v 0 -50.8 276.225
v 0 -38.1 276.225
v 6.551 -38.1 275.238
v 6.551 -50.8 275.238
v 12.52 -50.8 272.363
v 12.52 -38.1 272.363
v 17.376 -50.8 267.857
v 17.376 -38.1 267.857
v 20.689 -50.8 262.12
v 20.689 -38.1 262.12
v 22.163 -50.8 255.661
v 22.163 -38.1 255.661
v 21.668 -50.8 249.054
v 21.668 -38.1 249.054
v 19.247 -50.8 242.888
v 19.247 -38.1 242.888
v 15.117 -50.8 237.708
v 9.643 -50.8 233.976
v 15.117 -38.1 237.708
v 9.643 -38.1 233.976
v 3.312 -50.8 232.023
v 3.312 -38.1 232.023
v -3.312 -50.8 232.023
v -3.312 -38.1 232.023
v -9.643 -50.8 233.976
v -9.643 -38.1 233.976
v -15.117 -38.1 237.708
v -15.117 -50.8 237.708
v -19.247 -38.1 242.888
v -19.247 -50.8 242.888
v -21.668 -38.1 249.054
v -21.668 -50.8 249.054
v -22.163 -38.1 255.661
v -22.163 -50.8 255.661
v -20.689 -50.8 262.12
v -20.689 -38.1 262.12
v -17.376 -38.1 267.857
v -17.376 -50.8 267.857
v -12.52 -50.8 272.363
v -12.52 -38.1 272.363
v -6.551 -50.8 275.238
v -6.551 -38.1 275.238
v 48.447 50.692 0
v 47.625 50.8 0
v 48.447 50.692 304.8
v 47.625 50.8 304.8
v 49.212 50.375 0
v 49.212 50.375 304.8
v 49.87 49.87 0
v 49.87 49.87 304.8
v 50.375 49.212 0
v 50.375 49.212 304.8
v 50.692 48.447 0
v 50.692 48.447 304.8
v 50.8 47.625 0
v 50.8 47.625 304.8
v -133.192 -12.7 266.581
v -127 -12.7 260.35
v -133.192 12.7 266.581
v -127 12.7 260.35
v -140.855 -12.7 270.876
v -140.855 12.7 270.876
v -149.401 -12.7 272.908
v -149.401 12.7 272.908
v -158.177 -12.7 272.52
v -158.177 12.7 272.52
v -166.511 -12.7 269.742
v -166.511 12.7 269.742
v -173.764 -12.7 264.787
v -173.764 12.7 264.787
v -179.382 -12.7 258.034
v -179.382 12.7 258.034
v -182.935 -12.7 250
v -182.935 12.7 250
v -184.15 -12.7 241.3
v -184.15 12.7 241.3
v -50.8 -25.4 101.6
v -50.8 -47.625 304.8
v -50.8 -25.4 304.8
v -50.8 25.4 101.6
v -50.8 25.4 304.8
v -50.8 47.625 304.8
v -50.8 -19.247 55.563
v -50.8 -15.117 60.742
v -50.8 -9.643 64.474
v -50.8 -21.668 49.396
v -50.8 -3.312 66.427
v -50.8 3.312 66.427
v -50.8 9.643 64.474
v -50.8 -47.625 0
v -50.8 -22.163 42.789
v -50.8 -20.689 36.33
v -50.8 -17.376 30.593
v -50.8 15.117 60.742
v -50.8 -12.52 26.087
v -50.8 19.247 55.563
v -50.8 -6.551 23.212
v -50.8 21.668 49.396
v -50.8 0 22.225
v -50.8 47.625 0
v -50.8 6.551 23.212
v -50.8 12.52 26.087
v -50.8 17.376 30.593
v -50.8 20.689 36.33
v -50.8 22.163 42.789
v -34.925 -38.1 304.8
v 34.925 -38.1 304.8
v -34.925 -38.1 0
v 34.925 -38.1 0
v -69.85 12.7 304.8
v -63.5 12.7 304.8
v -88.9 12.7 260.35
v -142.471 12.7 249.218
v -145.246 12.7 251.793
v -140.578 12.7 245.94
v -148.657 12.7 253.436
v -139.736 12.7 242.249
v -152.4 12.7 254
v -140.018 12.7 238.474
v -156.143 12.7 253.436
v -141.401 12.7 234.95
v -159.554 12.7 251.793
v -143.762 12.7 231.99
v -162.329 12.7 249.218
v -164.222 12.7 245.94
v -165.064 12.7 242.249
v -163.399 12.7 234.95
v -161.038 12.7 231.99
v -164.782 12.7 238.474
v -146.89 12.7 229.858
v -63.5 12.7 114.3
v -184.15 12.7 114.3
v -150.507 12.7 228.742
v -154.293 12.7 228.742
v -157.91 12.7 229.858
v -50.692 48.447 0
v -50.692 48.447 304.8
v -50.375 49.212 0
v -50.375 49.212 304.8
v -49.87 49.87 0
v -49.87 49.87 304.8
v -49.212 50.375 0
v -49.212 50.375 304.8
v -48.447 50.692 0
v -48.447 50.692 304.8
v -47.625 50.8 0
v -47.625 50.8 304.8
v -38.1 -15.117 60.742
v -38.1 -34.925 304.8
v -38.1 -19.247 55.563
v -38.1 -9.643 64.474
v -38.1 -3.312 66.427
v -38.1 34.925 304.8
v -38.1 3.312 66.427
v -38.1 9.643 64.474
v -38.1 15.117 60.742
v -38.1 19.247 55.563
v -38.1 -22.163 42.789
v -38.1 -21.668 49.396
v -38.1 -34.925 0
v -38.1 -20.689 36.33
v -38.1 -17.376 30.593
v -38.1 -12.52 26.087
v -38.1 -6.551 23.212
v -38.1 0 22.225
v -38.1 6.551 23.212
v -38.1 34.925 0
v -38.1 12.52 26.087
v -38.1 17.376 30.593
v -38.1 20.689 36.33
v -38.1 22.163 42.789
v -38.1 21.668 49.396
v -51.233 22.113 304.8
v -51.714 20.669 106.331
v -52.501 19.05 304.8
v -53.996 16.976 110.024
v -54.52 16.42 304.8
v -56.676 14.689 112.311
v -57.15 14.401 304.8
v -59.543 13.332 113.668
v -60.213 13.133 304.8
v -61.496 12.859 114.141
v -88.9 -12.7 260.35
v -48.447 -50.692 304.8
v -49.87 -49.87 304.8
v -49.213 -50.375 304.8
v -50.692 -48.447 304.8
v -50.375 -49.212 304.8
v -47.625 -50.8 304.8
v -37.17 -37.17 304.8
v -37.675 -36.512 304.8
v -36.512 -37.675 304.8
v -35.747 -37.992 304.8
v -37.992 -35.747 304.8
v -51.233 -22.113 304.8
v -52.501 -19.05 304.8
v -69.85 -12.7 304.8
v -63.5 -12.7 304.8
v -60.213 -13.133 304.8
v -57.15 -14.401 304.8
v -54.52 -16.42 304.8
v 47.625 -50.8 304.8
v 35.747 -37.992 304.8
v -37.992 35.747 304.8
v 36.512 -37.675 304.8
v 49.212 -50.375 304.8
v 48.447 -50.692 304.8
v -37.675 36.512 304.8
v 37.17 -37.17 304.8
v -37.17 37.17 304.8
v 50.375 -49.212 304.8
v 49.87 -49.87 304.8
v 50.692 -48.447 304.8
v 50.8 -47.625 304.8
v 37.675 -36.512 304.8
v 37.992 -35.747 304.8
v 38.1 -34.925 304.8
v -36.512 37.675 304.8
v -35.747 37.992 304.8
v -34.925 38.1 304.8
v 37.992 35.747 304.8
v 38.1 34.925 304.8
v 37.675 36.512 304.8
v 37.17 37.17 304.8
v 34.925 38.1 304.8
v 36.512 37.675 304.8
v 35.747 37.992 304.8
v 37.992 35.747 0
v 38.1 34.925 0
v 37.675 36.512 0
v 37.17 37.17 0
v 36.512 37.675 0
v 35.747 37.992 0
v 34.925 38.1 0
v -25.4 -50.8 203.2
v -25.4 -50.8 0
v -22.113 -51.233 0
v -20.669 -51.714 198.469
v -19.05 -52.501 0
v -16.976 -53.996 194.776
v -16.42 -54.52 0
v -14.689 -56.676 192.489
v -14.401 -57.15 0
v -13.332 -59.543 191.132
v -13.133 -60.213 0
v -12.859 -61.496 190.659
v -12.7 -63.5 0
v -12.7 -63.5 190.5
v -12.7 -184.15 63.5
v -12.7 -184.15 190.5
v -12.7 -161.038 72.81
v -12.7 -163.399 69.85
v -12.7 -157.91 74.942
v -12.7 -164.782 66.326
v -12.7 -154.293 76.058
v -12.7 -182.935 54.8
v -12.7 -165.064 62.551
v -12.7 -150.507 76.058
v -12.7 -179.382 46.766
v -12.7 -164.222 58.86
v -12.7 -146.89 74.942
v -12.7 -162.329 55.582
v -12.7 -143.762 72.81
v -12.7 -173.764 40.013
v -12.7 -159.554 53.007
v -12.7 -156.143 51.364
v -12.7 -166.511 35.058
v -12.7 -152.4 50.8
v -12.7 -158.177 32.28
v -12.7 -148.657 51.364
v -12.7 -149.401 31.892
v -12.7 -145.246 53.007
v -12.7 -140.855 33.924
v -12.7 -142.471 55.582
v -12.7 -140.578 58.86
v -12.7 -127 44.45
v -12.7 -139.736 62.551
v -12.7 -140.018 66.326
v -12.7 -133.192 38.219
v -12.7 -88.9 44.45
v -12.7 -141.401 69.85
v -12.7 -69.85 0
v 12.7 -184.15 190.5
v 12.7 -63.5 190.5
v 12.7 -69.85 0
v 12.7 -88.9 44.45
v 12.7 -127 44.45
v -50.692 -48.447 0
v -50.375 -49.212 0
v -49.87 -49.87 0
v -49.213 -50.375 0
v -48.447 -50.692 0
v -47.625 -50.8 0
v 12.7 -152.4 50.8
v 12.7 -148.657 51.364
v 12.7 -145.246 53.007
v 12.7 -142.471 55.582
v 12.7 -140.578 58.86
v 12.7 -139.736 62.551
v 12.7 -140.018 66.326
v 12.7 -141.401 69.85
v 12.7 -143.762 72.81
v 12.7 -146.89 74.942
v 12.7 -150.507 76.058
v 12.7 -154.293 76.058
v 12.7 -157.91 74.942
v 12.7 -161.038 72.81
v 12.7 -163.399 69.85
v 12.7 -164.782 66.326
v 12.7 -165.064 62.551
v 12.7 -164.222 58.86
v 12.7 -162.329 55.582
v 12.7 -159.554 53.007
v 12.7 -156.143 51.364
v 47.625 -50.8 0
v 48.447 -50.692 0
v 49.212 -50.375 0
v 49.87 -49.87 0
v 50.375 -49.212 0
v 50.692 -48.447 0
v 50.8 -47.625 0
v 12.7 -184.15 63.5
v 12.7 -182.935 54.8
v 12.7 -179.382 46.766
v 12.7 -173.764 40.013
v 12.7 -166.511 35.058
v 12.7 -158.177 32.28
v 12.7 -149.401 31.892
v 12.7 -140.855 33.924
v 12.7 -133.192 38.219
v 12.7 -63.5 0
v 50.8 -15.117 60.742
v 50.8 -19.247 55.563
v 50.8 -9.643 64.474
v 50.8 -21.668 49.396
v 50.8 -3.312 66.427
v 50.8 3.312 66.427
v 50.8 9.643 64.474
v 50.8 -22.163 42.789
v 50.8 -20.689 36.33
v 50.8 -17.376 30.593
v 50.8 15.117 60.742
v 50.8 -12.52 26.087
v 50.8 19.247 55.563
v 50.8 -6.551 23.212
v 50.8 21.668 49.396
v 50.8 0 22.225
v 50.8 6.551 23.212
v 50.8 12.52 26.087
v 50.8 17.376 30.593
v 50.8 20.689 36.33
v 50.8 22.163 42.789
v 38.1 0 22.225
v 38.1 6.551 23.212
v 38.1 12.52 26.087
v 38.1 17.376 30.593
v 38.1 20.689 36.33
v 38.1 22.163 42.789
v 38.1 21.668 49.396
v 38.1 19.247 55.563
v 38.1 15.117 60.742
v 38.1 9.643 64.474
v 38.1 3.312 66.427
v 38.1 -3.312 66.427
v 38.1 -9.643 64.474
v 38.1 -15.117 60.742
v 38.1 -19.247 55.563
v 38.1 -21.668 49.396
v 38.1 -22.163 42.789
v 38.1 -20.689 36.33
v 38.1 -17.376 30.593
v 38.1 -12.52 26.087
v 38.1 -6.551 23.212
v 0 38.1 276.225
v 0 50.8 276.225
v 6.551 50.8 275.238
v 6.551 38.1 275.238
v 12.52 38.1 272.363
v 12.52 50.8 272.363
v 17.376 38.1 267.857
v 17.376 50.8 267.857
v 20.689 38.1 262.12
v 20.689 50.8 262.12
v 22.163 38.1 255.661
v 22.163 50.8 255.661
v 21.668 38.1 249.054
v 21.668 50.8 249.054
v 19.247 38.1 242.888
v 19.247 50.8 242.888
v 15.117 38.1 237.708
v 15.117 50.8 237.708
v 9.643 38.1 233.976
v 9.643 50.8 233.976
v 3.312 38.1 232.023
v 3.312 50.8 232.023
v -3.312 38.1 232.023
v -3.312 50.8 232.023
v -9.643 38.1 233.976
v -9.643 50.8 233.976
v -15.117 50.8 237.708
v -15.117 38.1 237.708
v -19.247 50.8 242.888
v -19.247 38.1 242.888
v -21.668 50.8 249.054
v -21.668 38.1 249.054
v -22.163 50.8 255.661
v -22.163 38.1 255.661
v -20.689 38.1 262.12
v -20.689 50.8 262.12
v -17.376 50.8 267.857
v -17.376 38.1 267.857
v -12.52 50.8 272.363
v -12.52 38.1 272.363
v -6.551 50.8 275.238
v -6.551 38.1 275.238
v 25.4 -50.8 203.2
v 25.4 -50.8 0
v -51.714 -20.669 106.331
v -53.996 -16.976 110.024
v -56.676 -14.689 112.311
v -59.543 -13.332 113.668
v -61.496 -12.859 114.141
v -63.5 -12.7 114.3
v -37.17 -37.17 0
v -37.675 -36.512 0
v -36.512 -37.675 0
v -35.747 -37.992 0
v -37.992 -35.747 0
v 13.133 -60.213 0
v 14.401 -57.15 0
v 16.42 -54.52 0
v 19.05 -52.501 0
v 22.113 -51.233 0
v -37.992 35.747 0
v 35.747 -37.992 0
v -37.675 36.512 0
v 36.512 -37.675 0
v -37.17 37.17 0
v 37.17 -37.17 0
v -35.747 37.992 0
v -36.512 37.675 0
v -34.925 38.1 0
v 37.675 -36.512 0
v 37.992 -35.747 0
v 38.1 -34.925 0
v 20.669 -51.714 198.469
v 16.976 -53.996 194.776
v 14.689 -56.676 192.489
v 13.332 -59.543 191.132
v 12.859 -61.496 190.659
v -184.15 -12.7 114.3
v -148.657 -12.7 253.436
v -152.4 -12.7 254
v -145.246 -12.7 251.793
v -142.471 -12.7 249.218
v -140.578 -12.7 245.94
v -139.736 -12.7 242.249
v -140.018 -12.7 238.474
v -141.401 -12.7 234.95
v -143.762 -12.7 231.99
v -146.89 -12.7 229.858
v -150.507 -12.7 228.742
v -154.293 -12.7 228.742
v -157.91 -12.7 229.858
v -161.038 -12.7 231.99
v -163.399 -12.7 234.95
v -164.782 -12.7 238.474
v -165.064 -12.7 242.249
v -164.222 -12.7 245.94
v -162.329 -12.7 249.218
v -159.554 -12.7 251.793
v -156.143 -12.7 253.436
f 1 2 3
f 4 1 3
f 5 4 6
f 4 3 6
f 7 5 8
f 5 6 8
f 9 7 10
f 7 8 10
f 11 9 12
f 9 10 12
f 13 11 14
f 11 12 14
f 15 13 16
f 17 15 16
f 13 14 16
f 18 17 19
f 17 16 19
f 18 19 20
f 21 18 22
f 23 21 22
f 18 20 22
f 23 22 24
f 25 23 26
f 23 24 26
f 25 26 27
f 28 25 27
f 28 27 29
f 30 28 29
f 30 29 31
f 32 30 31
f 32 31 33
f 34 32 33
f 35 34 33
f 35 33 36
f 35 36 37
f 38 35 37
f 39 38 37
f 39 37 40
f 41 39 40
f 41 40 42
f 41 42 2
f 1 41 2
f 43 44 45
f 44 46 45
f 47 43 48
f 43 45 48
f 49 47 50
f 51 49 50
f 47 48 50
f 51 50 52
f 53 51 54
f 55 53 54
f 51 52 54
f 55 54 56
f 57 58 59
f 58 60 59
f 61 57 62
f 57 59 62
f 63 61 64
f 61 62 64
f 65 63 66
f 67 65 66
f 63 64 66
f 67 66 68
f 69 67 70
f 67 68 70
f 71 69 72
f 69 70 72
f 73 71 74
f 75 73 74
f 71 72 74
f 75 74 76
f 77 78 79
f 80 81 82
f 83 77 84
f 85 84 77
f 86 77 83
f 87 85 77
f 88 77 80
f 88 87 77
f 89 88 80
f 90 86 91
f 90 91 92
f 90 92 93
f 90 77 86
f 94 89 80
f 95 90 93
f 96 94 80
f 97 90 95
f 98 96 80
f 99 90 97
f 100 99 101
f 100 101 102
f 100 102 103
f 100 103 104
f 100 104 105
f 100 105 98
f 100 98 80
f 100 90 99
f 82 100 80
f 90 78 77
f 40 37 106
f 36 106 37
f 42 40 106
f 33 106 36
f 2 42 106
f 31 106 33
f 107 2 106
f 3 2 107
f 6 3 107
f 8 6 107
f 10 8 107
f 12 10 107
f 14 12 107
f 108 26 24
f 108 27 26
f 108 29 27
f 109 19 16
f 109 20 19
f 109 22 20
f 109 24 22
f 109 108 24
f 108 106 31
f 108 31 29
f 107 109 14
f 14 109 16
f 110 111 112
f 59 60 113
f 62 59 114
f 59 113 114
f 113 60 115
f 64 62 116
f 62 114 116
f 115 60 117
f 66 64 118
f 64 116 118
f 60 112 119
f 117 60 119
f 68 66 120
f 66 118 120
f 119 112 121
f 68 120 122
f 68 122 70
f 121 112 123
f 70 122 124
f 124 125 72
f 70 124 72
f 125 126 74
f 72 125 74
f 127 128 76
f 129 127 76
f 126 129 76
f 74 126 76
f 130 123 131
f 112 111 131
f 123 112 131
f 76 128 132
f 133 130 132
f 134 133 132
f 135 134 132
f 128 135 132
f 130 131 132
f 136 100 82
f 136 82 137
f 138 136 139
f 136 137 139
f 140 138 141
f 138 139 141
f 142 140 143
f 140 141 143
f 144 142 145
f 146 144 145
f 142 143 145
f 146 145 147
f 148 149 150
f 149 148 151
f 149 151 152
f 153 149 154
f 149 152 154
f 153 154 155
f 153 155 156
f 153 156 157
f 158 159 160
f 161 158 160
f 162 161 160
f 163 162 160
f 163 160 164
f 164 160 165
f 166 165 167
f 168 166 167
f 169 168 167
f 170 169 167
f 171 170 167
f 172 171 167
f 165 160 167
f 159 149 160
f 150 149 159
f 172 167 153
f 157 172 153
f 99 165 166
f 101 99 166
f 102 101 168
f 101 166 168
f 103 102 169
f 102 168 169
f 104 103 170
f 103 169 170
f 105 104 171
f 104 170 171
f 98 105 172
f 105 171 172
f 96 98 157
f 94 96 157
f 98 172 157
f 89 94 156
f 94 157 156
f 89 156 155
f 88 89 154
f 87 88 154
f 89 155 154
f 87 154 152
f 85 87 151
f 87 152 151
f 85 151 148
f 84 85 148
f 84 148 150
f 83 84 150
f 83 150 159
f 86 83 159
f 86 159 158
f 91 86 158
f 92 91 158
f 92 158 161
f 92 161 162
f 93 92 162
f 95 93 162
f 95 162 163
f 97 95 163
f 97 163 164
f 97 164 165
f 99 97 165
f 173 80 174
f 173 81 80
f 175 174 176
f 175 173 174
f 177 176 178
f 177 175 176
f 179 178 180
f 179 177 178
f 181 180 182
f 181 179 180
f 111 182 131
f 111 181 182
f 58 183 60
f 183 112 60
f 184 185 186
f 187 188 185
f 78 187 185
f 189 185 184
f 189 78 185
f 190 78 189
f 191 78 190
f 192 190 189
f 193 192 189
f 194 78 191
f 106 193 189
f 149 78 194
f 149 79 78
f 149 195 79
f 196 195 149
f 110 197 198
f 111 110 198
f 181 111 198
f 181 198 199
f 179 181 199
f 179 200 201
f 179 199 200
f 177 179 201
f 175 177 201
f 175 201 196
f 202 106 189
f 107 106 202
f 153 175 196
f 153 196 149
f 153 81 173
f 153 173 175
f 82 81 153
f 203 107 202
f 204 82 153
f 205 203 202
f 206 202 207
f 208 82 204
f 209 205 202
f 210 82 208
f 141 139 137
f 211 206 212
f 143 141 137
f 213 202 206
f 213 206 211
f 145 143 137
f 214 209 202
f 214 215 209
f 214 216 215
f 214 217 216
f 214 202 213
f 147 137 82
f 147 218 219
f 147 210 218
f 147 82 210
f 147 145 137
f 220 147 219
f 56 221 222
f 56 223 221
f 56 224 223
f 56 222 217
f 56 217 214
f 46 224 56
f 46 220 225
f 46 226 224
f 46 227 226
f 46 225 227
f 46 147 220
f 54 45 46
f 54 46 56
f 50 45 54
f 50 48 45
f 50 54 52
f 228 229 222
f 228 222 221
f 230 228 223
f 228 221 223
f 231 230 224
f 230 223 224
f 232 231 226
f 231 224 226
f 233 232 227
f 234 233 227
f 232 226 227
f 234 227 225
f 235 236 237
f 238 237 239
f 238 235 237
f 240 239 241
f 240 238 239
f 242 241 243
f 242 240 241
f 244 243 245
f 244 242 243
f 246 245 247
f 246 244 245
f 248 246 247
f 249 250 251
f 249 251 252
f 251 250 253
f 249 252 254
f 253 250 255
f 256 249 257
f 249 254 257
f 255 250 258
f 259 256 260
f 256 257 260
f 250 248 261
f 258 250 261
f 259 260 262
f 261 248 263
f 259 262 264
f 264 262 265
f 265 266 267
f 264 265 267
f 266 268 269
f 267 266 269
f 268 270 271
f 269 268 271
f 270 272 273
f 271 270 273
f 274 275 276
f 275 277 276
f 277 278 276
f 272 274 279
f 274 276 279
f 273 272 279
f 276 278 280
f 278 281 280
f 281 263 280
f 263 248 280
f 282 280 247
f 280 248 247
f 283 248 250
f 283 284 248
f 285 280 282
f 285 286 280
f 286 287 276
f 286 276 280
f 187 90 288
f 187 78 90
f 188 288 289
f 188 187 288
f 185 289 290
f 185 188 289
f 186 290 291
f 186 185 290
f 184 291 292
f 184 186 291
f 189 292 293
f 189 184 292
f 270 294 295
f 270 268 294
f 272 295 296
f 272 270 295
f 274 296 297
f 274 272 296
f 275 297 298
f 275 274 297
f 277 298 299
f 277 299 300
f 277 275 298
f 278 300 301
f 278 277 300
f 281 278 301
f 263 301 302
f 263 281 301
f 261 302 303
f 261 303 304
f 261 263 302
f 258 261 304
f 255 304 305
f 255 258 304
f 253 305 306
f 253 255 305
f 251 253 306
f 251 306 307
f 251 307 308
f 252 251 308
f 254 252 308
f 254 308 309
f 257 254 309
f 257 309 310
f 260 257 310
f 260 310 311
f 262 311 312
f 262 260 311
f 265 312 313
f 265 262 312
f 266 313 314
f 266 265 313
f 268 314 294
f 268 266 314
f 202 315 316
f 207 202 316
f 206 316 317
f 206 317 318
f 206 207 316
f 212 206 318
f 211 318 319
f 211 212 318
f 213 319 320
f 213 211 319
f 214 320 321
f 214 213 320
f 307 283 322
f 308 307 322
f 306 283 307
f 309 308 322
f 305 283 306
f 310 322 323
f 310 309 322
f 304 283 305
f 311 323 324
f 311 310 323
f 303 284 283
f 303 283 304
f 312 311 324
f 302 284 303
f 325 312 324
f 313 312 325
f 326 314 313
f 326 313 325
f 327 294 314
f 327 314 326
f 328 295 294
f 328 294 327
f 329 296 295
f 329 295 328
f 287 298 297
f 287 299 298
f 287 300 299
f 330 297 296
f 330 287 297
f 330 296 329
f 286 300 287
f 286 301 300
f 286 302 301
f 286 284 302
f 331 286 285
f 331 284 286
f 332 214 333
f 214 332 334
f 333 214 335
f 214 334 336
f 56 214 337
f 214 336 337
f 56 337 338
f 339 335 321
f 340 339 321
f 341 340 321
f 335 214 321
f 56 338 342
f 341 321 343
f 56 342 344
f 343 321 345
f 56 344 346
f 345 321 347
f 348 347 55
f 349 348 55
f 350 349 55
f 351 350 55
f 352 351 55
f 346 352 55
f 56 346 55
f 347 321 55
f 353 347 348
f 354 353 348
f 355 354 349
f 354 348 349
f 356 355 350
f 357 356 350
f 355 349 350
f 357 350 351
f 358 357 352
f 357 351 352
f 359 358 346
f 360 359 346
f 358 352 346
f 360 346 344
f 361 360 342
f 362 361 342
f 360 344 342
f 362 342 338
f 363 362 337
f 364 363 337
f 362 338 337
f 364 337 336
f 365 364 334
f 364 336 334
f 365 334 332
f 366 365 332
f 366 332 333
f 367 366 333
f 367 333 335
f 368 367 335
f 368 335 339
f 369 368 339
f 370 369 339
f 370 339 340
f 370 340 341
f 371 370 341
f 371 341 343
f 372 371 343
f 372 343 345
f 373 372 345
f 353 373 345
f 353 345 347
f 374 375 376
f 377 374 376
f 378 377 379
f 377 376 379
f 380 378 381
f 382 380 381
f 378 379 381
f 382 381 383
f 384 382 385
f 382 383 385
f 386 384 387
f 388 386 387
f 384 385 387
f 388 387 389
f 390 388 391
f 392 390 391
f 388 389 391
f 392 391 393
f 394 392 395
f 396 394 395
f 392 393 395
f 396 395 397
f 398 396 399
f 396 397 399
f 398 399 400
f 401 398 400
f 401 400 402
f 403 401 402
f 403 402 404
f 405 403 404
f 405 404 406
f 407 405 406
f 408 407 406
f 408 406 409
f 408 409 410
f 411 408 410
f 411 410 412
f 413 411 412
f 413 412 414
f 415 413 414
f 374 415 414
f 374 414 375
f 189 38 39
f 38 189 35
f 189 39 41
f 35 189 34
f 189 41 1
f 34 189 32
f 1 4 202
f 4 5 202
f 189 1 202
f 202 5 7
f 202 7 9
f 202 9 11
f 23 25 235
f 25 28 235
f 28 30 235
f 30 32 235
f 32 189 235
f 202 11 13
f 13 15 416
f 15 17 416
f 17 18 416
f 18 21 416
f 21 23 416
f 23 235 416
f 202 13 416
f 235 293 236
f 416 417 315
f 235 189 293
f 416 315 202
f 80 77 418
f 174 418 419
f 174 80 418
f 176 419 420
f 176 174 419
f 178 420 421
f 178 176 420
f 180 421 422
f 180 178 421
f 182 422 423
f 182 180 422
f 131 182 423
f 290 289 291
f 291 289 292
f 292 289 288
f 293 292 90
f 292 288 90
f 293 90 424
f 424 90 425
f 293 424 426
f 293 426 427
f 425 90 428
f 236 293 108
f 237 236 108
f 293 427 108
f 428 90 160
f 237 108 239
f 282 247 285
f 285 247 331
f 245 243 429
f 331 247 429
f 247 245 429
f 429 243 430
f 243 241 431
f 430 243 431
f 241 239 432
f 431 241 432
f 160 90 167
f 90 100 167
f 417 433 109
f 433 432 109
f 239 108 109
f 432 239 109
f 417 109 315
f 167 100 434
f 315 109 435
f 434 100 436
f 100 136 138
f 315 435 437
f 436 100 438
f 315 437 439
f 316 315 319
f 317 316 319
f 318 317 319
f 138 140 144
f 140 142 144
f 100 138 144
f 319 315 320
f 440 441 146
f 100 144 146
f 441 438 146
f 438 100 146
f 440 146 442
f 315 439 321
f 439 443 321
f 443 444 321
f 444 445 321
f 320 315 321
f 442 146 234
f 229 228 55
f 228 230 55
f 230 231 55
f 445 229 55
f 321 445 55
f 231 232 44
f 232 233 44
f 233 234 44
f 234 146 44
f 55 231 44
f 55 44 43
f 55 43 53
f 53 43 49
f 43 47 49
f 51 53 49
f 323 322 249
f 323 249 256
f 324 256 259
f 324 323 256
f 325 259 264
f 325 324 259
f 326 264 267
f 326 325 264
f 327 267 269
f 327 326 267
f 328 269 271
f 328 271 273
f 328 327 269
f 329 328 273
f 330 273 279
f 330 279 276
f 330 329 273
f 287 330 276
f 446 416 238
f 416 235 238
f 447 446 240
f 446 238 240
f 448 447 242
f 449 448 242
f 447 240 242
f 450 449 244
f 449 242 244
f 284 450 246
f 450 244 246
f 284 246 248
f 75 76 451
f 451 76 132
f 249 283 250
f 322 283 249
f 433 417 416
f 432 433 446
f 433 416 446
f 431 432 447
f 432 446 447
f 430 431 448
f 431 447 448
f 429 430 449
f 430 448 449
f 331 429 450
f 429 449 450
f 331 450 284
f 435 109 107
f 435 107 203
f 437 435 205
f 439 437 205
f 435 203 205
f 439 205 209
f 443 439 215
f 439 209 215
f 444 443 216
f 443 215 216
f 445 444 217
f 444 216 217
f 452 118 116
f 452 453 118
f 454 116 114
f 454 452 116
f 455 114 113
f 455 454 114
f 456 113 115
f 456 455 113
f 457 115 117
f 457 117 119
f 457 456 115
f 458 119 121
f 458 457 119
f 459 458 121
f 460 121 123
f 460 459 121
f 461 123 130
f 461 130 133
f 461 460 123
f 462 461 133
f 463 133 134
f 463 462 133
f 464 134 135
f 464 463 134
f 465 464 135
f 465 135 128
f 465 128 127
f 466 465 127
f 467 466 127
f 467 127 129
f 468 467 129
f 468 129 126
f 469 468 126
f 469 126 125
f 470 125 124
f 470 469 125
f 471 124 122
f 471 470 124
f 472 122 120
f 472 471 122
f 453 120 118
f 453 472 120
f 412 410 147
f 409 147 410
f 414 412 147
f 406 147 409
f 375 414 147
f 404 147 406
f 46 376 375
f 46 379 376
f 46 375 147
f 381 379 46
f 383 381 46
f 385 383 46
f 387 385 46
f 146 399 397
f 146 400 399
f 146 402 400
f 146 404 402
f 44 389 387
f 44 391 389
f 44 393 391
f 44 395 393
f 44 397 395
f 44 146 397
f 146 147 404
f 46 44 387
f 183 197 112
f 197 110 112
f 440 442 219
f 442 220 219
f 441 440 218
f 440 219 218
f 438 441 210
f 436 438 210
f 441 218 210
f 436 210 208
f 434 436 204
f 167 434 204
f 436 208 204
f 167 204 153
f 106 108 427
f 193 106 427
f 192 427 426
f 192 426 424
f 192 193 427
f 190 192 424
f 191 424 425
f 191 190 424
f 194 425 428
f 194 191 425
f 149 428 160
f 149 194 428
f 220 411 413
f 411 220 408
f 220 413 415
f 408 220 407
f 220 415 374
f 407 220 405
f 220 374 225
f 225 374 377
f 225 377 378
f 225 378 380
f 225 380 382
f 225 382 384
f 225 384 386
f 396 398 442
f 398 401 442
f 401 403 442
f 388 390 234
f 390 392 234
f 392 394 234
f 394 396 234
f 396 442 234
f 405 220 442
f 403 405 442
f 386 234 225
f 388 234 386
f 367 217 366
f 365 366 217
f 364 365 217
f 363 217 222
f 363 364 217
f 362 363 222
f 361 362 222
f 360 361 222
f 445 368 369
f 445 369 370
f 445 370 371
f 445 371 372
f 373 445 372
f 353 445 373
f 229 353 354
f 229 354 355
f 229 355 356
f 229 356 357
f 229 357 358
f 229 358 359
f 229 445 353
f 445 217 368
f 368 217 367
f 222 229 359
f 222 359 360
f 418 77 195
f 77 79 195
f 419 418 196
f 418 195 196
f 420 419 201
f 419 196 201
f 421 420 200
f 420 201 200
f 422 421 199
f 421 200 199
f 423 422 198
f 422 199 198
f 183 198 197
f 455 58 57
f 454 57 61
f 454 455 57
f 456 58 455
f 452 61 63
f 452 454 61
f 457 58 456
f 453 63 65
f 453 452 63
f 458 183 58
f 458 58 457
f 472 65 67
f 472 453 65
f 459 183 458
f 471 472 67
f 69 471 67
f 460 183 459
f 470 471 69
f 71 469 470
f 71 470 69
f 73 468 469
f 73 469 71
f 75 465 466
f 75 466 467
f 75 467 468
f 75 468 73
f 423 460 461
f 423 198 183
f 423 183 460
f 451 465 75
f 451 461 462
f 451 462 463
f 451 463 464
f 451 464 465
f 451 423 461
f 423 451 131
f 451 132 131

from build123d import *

# Parameters (mm, degrees)
SKETCH1_W          = 101.6
SKETCH1_H          = 101.6
SKETCH1_W_2        = 76.2
SKETCH1_H_2        = 76.2
EXTRUDE1_DEPTH     = 304.8
FILLET1_R          = 3.175
SKETCH2_R          = 22.225
CUT_EXTRUDE1_DEPTH = 326.278711262
SKETCH3_R          = 12.7
EXTRUDE2_DEPTH     = 12.7
SKETCH6_R          = 12.7
EXTRUDE3_DEPTH     = 12.7
SKETCH7_R          = 22.225
CUT_EXTRUDE2_DEPTH = 427.633056619
FILLET2_R          = 12.7


with BuildPart() as part:
    # Sketch1 → Extrude1 (new body)
    with BuildSketch(Plane.XY):
        Rectangle(SKETCH1_W, SKETCH1_H)
        Rectangle(SKETCH1_W_2, SKETCH1_H_2, mode=Mode.SUBTRACT)
    extrude(amount=EXTRUDE1_DEPTH)

    # Fillet1
    fillet1_edges = [part.edges().sort_by_distance(p)[0] for p in [
        (-38.1, 38.1, 152.4),
        (-38.1, -38.1, 152.4),
        (38.1, -38.1, 152.4),
        (38.1, 38.1, 152.4),
        (-50.8, 50.8, 152.4),
        (50.8, 50.8, 152.4),
        (50.8, -50.8, 152.4),
        (-50.8, -50.8, 152.4),
    ]]
    fillet(fillet1_edges, radius=FILLET1_R)

    # Sketch2 → Cut-Extrude1 (cut, through all)
    with BuildSketch(Plane(origin=(50.8, 0, 0), x_dir=(0, 0, -1), z_dir=(1, 0, 0))):
        with Locations((-44.45, 0)):
            Circle(SKETCH2_R)
    extrude(amount=-CUT_EXTRUDE1_DEPTH, mode=Mode.SUBTRACT)

    # Sketch3 → Extrude2 (add, symmetric)
    with BuildSketch(Plane(origin=(0, 0, 0), x_dir=(1, 0, 0), z_dir=(0, 1, 0))):
        with BuildLine():
            Line((-50.8, -304.8), (-69.85, -304.8))
            Line((-69.85, -304.8), (-88.9, -260.35))
            Line((-88.9, -260.35), (-127, -260.35))
            ThreePointArc((-127, -260.35), (-162.440231571, -271.420694713), (-184.15, -241.3))
            Line((-184.15, -241.3), (-184.15, -114.3))
            Line((-184.15, -114.3), (-50.8, -114.3))
            Line((-50.8, -114.3), (-50.8, -304.8))
        make_face()
        with Locations(Location((-152.4, -241.3, 0), (0, 0, 270))):
            Circle(SKETCH3_R, mode=Mode.SUBTRACT)
    extrude(amount=EXTRUDE2_DEPTH, both=True)

    # Sketch6 → Extrude3 (add, symmetric)
    with BuildSketch(Plane(origin=(0, 0, 0), x_dir=(0, 0, -1), z_dir=(1, 0, 0))):
        with BuildLine():
            Line((-190.5, -50.8), (-190.5, -184.15))
            Line((-190.5, -184.15), (-63.5, -184.15))
            ThreePointArc((-63.5, -184.15), (-33.379305287, -162.440231571), (-44.45, -127))
            Line((-44.45, -127), (-44.45, -88.9))
            Line((-44.45, -88.9), (0, -69.85))
            Line((0, -69.85), (0, -50.8))
            Line((0, -50.8), (-190.5, -50.8))
        make_face()
        with Locations((-63.5, -152.4)):
            Circle(SKETCH6_R, mode=Mode.SUBTRACT)
    extrude(amount=EXTRUDE3_DEPTH, both=True)

    # Sketch7 → Cut-Extrude2 (cut, through all)
    with BuildSketch(Plane(origin=(0, 50.8, 0), x_dir=(-1, 0, 0), z_dir=(0, 1, 0))):
        with Locations(Location((0, 254, 0), (0, 0, 90))):
            Circle(SKETCH7_R)
    extrude(amount=-CUT_EXTRUDE2_DEPTH, mode=Mode.SUBTRACT)

    # Fillet2
    fillet2_edges = [part.edges().sort_by_distance(p)[0] for p in [
        (12.7, -50.8, 95.25),
        (-12.7, -50.8, 95.25),
        (0, -50.8, 190.5),
        (-50.8, 12.7, 209.55),
        (-50.8, -12.7, 209.55),
        (-50.8, 0, 114.3),
    ]]
    fillet(fillet2_edges, radius=FILLET2_R)


solid = part.part
